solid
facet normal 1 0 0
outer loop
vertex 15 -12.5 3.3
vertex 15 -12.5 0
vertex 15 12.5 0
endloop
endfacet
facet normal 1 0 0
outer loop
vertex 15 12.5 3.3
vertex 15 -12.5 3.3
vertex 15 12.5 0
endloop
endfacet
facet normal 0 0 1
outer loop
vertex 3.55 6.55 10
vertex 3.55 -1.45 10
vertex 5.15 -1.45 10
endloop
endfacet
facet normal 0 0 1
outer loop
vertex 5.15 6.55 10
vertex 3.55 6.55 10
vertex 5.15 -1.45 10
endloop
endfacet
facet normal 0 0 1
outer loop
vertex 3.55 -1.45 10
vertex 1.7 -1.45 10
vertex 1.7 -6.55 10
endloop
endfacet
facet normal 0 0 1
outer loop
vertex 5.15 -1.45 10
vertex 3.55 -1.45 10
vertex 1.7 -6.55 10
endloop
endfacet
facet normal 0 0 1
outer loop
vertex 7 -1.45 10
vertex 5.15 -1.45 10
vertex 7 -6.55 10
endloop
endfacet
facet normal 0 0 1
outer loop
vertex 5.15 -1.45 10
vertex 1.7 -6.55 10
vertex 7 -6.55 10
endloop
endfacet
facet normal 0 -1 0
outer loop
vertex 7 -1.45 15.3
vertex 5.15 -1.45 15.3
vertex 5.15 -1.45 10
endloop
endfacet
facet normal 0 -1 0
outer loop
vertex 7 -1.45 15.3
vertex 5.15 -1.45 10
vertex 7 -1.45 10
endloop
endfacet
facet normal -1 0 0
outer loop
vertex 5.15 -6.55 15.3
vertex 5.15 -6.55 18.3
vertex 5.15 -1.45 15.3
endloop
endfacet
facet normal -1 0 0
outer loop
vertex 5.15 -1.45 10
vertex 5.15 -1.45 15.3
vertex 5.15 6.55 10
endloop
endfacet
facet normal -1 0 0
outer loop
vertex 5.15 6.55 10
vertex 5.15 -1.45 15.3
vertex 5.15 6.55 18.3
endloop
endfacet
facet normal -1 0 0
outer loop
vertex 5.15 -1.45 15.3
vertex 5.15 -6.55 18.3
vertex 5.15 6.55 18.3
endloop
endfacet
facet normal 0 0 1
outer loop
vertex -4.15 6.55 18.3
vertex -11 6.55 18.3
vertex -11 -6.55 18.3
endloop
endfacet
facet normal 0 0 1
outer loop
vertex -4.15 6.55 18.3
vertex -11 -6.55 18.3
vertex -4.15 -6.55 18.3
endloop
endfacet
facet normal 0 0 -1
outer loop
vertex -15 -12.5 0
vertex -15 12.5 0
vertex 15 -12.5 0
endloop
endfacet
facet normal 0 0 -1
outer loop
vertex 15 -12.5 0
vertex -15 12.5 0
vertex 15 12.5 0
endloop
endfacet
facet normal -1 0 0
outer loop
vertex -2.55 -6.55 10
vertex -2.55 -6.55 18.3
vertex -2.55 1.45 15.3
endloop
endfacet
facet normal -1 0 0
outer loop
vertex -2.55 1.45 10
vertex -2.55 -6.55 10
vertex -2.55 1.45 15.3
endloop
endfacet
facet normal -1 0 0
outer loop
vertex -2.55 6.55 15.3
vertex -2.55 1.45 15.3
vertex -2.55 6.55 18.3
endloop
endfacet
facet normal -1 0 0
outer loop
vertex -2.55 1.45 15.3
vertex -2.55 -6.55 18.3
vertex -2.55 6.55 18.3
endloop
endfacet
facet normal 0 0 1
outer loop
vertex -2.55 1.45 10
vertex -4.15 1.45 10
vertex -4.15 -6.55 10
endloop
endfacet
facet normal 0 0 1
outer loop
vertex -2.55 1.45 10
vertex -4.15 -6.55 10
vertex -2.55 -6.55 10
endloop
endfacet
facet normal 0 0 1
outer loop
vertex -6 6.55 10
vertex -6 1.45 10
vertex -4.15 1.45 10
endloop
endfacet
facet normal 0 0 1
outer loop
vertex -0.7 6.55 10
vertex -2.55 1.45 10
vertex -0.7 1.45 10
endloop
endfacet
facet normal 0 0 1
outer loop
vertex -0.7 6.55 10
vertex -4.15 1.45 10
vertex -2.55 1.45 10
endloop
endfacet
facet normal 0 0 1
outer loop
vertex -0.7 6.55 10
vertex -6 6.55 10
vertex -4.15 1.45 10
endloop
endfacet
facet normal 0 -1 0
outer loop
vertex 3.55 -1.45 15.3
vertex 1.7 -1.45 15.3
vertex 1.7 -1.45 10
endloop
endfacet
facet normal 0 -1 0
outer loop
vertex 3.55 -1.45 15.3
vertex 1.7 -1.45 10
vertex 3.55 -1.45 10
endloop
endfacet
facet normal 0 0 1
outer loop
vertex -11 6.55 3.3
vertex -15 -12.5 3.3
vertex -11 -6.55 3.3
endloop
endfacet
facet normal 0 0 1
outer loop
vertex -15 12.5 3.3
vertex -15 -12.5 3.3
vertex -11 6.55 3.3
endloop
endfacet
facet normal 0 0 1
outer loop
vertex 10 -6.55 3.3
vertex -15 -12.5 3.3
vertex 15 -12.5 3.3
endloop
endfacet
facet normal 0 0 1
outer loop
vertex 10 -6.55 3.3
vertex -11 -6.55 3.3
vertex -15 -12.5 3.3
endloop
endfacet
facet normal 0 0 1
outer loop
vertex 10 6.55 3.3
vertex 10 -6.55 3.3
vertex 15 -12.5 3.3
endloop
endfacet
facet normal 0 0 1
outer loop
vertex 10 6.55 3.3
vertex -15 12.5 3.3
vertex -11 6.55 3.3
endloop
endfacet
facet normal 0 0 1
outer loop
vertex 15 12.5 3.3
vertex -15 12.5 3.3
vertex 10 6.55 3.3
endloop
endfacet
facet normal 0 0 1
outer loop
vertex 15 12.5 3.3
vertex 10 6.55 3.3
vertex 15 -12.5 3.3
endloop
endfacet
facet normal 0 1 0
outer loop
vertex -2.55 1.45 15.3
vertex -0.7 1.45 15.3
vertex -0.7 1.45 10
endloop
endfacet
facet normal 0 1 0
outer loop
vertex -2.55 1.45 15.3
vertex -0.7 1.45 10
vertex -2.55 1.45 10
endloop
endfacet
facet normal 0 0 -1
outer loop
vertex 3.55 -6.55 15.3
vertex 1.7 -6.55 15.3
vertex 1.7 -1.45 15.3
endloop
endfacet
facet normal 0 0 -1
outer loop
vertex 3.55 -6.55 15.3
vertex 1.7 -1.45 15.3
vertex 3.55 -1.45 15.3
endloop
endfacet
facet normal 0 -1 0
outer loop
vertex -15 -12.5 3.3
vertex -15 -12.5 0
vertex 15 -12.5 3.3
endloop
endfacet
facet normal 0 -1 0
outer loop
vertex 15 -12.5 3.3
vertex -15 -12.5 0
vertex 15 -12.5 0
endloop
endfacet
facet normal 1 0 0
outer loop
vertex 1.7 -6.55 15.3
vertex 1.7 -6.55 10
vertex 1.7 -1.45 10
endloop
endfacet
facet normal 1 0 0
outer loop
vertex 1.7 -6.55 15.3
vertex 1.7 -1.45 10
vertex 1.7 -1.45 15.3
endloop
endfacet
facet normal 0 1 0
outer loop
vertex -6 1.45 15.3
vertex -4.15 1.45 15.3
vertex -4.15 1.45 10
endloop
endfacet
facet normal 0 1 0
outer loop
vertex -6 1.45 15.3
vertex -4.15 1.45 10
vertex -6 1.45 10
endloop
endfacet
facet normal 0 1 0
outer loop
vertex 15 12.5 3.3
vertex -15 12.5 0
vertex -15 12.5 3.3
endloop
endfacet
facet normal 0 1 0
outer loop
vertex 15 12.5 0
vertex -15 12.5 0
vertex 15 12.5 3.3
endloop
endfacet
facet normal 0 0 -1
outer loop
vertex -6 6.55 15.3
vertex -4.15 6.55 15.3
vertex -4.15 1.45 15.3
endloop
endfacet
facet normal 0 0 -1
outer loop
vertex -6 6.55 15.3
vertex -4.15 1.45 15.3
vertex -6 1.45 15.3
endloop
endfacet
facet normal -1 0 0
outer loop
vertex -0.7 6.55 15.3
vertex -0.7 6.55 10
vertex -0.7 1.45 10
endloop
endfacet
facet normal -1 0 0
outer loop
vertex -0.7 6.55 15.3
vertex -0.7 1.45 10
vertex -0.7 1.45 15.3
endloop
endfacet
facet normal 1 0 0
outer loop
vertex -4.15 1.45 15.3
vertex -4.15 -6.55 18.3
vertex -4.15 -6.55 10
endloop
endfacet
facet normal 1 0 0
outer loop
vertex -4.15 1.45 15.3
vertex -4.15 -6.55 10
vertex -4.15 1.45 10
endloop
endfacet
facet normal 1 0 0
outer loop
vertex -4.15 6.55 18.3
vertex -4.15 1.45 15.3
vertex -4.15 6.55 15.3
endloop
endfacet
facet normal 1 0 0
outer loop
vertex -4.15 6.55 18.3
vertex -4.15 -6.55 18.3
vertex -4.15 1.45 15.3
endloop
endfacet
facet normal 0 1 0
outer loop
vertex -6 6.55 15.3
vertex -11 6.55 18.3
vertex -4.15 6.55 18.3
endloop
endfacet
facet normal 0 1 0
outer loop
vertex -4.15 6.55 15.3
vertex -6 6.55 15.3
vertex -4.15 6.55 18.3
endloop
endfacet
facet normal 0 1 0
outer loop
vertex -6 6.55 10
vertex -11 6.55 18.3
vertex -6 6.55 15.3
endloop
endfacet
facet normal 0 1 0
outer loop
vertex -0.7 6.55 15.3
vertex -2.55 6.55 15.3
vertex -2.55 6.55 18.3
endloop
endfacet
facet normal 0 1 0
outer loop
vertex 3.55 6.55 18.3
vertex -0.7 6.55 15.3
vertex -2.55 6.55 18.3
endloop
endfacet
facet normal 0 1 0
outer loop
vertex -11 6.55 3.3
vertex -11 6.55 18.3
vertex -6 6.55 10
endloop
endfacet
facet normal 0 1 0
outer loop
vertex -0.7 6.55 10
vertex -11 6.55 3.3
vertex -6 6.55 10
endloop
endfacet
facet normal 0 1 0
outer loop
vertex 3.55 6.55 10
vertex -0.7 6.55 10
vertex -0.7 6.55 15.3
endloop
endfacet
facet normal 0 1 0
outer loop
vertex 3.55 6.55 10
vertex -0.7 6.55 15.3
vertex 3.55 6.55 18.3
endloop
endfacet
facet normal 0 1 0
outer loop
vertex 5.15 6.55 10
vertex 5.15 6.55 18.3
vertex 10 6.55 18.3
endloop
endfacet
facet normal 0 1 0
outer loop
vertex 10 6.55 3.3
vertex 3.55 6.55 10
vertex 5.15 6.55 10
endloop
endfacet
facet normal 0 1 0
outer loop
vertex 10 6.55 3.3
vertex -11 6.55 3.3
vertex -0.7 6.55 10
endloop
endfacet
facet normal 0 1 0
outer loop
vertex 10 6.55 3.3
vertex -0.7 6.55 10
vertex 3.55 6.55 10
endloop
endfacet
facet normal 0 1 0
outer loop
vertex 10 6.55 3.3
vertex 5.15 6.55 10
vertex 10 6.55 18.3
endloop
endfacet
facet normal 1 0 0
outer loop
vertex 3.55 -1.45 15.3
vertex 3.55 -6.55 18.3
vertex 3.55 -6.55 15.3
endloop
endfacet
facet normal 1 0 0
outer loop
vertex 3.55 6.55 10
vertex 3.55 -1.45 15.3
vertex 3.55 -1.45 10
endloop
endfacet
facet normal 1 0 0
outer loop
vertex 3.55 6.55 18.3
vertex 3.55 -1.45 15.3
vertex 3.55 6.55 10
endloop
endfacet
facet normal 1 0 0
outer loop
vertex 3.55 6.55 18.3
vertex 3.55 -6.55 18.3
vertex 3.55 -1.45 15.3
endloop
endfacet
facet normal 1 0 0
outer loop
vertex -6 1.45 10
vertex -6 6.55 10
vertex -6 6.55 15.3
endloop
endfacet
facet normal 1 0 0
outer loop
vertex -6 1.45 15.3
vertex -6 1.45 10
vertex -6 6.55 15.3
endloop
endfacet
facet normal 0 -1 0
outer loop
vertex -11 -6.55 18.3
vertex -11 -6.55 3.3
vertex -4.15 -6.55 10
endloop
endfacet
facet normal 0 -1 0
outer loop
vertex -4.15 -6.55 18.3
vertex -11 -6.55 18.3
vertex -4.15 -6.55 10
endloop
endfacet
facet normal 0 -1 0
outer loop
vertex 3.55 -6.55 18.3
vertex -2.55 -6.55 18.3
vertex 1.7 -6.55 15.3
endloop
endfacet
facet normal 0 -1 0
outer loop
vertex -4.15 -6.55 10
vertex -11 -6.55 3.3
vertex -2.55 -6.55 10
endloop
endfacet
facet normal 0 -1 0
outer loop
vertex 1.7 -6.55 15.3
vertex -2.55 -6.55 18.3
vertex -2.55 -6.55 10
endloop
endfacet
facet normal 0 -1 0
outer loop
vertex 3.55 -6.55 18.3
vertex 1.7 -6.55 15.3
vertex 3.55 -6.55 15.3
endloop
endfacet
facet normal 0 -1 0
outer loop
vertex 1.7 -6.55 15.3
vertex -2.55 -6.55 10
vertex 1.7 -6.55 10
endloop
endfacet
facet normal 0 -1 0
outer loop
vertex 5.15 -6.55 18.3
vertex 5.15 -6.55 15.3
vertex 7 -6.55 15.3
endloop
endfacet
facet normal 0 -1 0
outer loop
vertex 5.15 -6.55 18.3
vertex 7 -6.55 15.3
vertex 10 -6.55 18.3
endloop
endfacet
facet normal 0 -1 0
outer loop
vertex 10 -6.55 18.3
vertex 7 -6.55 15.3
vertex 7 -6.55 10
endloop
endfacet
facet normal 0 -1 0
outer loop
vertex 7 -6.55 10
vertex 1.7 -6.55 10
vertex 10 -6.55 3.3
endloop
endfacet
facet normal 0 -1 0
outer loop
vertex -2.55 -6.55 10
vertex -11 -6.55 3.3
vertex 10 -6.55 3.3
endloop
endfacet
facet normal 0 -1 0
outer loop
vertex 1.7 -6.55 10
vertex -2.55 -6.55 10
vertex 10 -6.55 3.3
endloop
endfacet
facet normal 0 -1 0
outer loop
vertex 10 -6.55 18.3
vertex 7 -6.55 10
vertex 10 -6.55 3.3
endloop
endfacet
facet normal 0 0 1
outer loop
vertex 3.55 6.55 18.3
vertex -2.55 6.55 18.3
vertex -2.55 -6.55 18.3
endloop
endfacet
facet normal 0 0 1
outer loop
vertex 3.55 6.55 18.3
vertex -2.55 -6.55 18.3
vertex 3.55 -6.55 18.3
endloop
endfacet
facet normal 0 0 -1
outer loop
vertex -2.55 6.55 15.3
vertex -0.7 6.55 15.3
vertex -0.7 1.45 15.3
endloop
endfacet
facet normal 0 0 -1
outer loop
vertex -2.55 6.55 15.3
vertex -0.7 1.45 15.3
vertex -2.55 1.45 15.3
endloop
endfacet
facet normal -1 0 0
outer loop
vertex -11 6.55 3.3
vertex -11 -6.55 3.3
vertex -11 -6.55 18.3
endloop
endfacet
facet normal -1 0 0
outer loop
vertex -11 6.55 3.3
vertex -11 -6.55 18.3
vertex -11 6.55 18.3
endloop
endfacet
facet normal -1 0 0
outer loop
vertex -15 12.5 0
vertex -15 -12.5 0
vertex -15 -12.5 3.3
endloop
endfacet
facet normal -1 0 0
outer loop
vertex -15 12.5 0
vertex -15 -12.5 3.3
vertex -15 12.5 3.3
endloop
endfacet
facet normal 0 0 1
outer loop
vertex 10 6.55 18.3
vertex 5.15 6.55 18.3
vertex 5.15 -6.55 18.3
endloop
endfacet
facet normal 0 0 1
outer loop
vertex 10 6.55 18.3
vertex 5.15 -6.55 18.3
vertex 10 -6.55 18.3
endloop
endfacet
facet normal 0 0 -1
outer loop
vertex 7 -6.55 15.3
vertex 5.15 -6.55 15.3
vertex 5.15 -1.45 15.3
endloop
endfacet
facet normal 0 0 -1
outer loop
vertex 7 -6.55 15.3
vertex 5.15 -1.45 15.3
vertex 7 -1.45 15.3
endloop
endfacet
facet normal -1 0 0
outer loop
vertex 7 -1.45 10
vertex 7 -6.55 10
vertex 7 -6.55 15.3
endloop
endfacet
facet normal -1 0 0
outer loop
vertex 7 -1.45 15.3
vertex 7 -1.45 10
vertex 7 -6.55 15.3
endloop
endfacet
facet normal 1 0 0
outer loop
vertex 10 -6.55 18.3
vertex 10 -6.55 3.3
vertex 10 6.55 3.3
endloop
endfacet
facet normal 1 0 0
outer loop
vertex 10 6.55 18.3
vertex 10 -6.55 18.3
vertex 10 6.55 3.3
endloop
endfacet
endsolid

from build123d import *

# Parameters (mm, degrees)
F0_W      = 30
F0_H      = 25
F1_DEPTH  = 3.3
F2_W      = 21
F2_H      = 13.1
F3_DEPTH  = 15
F4_W      = 5.3
F4_H      = 5.3
F5_DEPTH  = 5.1
F6_W      = 1.6
F6_H      = 13.1
F7_DEPTH  = 8.3
F8_W      = 5.3
F8_H      = 5.3
F9_DEPTH  = 5.1
F10_W     = 1.6
F10_H     = 13.1
F11_DEPTH = 8.3


# Not quite as in the source:
# - a feature names something its author has since deleted; it is built from what else it names


with BuildPart() as f1:
    # F0 (on Top) → F1 (new body)
    with BuildSketch(Plane.XY):
        Rectangle(F0_W, F0_H)
    extrude(amount=F1_DEPTH)

    # F2 (on face) → F3 (join)
    with BuildSketch(Plane.XY.offset(3.3)):
        with Locations((-0.5, 0)):
            Rectangle(F2_W, F2_H)
    extrude(amount=F3_DEPTH)

    # F4 (on face) → F5 (cut)
    with BuildSketch(Plane.XZ.offset(6.55)):
        with Locations((4.35, 12.65)):
            Rectangle(F4_W, F4_H)
    extrude(amount=-F5_DEPTH, mode=Mode.SUBTRACT)

    # F6 (on face) → F7 (cut)
    with BuildSketch(Plane.XY.offset(18.3)):
        with Locations((4.35, 0)):
            Rectangle(F6_W, F6_H)
    extrude(amount=-F7_DEPTH, mode=Mode.SUBTRACT)

    # F8 (on face) → F9 (cut)
    with BuildSketch(Plane(origin=(0, 6.55, 0), x_dir=(-1, 0, 0), z_dir=(0, 1, 0))):
        with Locations((3.35, 12.65)):
            Rectangle(F8_W, F8_H)
    extrude(amount=-F9_DEPTH, mode=Mode.SUBTRACT)

    # F10 (on face) → F11 (cut)
    with BuildSketch(Plane.XY.offset(18.3)):
        with Locations((-3.35, 0)):
            Rectangle(F10_W, F10_H)
    extrude(amount=-F11_DEPTH, mode=Mode.SUBTRACT)


solid = f1.part
